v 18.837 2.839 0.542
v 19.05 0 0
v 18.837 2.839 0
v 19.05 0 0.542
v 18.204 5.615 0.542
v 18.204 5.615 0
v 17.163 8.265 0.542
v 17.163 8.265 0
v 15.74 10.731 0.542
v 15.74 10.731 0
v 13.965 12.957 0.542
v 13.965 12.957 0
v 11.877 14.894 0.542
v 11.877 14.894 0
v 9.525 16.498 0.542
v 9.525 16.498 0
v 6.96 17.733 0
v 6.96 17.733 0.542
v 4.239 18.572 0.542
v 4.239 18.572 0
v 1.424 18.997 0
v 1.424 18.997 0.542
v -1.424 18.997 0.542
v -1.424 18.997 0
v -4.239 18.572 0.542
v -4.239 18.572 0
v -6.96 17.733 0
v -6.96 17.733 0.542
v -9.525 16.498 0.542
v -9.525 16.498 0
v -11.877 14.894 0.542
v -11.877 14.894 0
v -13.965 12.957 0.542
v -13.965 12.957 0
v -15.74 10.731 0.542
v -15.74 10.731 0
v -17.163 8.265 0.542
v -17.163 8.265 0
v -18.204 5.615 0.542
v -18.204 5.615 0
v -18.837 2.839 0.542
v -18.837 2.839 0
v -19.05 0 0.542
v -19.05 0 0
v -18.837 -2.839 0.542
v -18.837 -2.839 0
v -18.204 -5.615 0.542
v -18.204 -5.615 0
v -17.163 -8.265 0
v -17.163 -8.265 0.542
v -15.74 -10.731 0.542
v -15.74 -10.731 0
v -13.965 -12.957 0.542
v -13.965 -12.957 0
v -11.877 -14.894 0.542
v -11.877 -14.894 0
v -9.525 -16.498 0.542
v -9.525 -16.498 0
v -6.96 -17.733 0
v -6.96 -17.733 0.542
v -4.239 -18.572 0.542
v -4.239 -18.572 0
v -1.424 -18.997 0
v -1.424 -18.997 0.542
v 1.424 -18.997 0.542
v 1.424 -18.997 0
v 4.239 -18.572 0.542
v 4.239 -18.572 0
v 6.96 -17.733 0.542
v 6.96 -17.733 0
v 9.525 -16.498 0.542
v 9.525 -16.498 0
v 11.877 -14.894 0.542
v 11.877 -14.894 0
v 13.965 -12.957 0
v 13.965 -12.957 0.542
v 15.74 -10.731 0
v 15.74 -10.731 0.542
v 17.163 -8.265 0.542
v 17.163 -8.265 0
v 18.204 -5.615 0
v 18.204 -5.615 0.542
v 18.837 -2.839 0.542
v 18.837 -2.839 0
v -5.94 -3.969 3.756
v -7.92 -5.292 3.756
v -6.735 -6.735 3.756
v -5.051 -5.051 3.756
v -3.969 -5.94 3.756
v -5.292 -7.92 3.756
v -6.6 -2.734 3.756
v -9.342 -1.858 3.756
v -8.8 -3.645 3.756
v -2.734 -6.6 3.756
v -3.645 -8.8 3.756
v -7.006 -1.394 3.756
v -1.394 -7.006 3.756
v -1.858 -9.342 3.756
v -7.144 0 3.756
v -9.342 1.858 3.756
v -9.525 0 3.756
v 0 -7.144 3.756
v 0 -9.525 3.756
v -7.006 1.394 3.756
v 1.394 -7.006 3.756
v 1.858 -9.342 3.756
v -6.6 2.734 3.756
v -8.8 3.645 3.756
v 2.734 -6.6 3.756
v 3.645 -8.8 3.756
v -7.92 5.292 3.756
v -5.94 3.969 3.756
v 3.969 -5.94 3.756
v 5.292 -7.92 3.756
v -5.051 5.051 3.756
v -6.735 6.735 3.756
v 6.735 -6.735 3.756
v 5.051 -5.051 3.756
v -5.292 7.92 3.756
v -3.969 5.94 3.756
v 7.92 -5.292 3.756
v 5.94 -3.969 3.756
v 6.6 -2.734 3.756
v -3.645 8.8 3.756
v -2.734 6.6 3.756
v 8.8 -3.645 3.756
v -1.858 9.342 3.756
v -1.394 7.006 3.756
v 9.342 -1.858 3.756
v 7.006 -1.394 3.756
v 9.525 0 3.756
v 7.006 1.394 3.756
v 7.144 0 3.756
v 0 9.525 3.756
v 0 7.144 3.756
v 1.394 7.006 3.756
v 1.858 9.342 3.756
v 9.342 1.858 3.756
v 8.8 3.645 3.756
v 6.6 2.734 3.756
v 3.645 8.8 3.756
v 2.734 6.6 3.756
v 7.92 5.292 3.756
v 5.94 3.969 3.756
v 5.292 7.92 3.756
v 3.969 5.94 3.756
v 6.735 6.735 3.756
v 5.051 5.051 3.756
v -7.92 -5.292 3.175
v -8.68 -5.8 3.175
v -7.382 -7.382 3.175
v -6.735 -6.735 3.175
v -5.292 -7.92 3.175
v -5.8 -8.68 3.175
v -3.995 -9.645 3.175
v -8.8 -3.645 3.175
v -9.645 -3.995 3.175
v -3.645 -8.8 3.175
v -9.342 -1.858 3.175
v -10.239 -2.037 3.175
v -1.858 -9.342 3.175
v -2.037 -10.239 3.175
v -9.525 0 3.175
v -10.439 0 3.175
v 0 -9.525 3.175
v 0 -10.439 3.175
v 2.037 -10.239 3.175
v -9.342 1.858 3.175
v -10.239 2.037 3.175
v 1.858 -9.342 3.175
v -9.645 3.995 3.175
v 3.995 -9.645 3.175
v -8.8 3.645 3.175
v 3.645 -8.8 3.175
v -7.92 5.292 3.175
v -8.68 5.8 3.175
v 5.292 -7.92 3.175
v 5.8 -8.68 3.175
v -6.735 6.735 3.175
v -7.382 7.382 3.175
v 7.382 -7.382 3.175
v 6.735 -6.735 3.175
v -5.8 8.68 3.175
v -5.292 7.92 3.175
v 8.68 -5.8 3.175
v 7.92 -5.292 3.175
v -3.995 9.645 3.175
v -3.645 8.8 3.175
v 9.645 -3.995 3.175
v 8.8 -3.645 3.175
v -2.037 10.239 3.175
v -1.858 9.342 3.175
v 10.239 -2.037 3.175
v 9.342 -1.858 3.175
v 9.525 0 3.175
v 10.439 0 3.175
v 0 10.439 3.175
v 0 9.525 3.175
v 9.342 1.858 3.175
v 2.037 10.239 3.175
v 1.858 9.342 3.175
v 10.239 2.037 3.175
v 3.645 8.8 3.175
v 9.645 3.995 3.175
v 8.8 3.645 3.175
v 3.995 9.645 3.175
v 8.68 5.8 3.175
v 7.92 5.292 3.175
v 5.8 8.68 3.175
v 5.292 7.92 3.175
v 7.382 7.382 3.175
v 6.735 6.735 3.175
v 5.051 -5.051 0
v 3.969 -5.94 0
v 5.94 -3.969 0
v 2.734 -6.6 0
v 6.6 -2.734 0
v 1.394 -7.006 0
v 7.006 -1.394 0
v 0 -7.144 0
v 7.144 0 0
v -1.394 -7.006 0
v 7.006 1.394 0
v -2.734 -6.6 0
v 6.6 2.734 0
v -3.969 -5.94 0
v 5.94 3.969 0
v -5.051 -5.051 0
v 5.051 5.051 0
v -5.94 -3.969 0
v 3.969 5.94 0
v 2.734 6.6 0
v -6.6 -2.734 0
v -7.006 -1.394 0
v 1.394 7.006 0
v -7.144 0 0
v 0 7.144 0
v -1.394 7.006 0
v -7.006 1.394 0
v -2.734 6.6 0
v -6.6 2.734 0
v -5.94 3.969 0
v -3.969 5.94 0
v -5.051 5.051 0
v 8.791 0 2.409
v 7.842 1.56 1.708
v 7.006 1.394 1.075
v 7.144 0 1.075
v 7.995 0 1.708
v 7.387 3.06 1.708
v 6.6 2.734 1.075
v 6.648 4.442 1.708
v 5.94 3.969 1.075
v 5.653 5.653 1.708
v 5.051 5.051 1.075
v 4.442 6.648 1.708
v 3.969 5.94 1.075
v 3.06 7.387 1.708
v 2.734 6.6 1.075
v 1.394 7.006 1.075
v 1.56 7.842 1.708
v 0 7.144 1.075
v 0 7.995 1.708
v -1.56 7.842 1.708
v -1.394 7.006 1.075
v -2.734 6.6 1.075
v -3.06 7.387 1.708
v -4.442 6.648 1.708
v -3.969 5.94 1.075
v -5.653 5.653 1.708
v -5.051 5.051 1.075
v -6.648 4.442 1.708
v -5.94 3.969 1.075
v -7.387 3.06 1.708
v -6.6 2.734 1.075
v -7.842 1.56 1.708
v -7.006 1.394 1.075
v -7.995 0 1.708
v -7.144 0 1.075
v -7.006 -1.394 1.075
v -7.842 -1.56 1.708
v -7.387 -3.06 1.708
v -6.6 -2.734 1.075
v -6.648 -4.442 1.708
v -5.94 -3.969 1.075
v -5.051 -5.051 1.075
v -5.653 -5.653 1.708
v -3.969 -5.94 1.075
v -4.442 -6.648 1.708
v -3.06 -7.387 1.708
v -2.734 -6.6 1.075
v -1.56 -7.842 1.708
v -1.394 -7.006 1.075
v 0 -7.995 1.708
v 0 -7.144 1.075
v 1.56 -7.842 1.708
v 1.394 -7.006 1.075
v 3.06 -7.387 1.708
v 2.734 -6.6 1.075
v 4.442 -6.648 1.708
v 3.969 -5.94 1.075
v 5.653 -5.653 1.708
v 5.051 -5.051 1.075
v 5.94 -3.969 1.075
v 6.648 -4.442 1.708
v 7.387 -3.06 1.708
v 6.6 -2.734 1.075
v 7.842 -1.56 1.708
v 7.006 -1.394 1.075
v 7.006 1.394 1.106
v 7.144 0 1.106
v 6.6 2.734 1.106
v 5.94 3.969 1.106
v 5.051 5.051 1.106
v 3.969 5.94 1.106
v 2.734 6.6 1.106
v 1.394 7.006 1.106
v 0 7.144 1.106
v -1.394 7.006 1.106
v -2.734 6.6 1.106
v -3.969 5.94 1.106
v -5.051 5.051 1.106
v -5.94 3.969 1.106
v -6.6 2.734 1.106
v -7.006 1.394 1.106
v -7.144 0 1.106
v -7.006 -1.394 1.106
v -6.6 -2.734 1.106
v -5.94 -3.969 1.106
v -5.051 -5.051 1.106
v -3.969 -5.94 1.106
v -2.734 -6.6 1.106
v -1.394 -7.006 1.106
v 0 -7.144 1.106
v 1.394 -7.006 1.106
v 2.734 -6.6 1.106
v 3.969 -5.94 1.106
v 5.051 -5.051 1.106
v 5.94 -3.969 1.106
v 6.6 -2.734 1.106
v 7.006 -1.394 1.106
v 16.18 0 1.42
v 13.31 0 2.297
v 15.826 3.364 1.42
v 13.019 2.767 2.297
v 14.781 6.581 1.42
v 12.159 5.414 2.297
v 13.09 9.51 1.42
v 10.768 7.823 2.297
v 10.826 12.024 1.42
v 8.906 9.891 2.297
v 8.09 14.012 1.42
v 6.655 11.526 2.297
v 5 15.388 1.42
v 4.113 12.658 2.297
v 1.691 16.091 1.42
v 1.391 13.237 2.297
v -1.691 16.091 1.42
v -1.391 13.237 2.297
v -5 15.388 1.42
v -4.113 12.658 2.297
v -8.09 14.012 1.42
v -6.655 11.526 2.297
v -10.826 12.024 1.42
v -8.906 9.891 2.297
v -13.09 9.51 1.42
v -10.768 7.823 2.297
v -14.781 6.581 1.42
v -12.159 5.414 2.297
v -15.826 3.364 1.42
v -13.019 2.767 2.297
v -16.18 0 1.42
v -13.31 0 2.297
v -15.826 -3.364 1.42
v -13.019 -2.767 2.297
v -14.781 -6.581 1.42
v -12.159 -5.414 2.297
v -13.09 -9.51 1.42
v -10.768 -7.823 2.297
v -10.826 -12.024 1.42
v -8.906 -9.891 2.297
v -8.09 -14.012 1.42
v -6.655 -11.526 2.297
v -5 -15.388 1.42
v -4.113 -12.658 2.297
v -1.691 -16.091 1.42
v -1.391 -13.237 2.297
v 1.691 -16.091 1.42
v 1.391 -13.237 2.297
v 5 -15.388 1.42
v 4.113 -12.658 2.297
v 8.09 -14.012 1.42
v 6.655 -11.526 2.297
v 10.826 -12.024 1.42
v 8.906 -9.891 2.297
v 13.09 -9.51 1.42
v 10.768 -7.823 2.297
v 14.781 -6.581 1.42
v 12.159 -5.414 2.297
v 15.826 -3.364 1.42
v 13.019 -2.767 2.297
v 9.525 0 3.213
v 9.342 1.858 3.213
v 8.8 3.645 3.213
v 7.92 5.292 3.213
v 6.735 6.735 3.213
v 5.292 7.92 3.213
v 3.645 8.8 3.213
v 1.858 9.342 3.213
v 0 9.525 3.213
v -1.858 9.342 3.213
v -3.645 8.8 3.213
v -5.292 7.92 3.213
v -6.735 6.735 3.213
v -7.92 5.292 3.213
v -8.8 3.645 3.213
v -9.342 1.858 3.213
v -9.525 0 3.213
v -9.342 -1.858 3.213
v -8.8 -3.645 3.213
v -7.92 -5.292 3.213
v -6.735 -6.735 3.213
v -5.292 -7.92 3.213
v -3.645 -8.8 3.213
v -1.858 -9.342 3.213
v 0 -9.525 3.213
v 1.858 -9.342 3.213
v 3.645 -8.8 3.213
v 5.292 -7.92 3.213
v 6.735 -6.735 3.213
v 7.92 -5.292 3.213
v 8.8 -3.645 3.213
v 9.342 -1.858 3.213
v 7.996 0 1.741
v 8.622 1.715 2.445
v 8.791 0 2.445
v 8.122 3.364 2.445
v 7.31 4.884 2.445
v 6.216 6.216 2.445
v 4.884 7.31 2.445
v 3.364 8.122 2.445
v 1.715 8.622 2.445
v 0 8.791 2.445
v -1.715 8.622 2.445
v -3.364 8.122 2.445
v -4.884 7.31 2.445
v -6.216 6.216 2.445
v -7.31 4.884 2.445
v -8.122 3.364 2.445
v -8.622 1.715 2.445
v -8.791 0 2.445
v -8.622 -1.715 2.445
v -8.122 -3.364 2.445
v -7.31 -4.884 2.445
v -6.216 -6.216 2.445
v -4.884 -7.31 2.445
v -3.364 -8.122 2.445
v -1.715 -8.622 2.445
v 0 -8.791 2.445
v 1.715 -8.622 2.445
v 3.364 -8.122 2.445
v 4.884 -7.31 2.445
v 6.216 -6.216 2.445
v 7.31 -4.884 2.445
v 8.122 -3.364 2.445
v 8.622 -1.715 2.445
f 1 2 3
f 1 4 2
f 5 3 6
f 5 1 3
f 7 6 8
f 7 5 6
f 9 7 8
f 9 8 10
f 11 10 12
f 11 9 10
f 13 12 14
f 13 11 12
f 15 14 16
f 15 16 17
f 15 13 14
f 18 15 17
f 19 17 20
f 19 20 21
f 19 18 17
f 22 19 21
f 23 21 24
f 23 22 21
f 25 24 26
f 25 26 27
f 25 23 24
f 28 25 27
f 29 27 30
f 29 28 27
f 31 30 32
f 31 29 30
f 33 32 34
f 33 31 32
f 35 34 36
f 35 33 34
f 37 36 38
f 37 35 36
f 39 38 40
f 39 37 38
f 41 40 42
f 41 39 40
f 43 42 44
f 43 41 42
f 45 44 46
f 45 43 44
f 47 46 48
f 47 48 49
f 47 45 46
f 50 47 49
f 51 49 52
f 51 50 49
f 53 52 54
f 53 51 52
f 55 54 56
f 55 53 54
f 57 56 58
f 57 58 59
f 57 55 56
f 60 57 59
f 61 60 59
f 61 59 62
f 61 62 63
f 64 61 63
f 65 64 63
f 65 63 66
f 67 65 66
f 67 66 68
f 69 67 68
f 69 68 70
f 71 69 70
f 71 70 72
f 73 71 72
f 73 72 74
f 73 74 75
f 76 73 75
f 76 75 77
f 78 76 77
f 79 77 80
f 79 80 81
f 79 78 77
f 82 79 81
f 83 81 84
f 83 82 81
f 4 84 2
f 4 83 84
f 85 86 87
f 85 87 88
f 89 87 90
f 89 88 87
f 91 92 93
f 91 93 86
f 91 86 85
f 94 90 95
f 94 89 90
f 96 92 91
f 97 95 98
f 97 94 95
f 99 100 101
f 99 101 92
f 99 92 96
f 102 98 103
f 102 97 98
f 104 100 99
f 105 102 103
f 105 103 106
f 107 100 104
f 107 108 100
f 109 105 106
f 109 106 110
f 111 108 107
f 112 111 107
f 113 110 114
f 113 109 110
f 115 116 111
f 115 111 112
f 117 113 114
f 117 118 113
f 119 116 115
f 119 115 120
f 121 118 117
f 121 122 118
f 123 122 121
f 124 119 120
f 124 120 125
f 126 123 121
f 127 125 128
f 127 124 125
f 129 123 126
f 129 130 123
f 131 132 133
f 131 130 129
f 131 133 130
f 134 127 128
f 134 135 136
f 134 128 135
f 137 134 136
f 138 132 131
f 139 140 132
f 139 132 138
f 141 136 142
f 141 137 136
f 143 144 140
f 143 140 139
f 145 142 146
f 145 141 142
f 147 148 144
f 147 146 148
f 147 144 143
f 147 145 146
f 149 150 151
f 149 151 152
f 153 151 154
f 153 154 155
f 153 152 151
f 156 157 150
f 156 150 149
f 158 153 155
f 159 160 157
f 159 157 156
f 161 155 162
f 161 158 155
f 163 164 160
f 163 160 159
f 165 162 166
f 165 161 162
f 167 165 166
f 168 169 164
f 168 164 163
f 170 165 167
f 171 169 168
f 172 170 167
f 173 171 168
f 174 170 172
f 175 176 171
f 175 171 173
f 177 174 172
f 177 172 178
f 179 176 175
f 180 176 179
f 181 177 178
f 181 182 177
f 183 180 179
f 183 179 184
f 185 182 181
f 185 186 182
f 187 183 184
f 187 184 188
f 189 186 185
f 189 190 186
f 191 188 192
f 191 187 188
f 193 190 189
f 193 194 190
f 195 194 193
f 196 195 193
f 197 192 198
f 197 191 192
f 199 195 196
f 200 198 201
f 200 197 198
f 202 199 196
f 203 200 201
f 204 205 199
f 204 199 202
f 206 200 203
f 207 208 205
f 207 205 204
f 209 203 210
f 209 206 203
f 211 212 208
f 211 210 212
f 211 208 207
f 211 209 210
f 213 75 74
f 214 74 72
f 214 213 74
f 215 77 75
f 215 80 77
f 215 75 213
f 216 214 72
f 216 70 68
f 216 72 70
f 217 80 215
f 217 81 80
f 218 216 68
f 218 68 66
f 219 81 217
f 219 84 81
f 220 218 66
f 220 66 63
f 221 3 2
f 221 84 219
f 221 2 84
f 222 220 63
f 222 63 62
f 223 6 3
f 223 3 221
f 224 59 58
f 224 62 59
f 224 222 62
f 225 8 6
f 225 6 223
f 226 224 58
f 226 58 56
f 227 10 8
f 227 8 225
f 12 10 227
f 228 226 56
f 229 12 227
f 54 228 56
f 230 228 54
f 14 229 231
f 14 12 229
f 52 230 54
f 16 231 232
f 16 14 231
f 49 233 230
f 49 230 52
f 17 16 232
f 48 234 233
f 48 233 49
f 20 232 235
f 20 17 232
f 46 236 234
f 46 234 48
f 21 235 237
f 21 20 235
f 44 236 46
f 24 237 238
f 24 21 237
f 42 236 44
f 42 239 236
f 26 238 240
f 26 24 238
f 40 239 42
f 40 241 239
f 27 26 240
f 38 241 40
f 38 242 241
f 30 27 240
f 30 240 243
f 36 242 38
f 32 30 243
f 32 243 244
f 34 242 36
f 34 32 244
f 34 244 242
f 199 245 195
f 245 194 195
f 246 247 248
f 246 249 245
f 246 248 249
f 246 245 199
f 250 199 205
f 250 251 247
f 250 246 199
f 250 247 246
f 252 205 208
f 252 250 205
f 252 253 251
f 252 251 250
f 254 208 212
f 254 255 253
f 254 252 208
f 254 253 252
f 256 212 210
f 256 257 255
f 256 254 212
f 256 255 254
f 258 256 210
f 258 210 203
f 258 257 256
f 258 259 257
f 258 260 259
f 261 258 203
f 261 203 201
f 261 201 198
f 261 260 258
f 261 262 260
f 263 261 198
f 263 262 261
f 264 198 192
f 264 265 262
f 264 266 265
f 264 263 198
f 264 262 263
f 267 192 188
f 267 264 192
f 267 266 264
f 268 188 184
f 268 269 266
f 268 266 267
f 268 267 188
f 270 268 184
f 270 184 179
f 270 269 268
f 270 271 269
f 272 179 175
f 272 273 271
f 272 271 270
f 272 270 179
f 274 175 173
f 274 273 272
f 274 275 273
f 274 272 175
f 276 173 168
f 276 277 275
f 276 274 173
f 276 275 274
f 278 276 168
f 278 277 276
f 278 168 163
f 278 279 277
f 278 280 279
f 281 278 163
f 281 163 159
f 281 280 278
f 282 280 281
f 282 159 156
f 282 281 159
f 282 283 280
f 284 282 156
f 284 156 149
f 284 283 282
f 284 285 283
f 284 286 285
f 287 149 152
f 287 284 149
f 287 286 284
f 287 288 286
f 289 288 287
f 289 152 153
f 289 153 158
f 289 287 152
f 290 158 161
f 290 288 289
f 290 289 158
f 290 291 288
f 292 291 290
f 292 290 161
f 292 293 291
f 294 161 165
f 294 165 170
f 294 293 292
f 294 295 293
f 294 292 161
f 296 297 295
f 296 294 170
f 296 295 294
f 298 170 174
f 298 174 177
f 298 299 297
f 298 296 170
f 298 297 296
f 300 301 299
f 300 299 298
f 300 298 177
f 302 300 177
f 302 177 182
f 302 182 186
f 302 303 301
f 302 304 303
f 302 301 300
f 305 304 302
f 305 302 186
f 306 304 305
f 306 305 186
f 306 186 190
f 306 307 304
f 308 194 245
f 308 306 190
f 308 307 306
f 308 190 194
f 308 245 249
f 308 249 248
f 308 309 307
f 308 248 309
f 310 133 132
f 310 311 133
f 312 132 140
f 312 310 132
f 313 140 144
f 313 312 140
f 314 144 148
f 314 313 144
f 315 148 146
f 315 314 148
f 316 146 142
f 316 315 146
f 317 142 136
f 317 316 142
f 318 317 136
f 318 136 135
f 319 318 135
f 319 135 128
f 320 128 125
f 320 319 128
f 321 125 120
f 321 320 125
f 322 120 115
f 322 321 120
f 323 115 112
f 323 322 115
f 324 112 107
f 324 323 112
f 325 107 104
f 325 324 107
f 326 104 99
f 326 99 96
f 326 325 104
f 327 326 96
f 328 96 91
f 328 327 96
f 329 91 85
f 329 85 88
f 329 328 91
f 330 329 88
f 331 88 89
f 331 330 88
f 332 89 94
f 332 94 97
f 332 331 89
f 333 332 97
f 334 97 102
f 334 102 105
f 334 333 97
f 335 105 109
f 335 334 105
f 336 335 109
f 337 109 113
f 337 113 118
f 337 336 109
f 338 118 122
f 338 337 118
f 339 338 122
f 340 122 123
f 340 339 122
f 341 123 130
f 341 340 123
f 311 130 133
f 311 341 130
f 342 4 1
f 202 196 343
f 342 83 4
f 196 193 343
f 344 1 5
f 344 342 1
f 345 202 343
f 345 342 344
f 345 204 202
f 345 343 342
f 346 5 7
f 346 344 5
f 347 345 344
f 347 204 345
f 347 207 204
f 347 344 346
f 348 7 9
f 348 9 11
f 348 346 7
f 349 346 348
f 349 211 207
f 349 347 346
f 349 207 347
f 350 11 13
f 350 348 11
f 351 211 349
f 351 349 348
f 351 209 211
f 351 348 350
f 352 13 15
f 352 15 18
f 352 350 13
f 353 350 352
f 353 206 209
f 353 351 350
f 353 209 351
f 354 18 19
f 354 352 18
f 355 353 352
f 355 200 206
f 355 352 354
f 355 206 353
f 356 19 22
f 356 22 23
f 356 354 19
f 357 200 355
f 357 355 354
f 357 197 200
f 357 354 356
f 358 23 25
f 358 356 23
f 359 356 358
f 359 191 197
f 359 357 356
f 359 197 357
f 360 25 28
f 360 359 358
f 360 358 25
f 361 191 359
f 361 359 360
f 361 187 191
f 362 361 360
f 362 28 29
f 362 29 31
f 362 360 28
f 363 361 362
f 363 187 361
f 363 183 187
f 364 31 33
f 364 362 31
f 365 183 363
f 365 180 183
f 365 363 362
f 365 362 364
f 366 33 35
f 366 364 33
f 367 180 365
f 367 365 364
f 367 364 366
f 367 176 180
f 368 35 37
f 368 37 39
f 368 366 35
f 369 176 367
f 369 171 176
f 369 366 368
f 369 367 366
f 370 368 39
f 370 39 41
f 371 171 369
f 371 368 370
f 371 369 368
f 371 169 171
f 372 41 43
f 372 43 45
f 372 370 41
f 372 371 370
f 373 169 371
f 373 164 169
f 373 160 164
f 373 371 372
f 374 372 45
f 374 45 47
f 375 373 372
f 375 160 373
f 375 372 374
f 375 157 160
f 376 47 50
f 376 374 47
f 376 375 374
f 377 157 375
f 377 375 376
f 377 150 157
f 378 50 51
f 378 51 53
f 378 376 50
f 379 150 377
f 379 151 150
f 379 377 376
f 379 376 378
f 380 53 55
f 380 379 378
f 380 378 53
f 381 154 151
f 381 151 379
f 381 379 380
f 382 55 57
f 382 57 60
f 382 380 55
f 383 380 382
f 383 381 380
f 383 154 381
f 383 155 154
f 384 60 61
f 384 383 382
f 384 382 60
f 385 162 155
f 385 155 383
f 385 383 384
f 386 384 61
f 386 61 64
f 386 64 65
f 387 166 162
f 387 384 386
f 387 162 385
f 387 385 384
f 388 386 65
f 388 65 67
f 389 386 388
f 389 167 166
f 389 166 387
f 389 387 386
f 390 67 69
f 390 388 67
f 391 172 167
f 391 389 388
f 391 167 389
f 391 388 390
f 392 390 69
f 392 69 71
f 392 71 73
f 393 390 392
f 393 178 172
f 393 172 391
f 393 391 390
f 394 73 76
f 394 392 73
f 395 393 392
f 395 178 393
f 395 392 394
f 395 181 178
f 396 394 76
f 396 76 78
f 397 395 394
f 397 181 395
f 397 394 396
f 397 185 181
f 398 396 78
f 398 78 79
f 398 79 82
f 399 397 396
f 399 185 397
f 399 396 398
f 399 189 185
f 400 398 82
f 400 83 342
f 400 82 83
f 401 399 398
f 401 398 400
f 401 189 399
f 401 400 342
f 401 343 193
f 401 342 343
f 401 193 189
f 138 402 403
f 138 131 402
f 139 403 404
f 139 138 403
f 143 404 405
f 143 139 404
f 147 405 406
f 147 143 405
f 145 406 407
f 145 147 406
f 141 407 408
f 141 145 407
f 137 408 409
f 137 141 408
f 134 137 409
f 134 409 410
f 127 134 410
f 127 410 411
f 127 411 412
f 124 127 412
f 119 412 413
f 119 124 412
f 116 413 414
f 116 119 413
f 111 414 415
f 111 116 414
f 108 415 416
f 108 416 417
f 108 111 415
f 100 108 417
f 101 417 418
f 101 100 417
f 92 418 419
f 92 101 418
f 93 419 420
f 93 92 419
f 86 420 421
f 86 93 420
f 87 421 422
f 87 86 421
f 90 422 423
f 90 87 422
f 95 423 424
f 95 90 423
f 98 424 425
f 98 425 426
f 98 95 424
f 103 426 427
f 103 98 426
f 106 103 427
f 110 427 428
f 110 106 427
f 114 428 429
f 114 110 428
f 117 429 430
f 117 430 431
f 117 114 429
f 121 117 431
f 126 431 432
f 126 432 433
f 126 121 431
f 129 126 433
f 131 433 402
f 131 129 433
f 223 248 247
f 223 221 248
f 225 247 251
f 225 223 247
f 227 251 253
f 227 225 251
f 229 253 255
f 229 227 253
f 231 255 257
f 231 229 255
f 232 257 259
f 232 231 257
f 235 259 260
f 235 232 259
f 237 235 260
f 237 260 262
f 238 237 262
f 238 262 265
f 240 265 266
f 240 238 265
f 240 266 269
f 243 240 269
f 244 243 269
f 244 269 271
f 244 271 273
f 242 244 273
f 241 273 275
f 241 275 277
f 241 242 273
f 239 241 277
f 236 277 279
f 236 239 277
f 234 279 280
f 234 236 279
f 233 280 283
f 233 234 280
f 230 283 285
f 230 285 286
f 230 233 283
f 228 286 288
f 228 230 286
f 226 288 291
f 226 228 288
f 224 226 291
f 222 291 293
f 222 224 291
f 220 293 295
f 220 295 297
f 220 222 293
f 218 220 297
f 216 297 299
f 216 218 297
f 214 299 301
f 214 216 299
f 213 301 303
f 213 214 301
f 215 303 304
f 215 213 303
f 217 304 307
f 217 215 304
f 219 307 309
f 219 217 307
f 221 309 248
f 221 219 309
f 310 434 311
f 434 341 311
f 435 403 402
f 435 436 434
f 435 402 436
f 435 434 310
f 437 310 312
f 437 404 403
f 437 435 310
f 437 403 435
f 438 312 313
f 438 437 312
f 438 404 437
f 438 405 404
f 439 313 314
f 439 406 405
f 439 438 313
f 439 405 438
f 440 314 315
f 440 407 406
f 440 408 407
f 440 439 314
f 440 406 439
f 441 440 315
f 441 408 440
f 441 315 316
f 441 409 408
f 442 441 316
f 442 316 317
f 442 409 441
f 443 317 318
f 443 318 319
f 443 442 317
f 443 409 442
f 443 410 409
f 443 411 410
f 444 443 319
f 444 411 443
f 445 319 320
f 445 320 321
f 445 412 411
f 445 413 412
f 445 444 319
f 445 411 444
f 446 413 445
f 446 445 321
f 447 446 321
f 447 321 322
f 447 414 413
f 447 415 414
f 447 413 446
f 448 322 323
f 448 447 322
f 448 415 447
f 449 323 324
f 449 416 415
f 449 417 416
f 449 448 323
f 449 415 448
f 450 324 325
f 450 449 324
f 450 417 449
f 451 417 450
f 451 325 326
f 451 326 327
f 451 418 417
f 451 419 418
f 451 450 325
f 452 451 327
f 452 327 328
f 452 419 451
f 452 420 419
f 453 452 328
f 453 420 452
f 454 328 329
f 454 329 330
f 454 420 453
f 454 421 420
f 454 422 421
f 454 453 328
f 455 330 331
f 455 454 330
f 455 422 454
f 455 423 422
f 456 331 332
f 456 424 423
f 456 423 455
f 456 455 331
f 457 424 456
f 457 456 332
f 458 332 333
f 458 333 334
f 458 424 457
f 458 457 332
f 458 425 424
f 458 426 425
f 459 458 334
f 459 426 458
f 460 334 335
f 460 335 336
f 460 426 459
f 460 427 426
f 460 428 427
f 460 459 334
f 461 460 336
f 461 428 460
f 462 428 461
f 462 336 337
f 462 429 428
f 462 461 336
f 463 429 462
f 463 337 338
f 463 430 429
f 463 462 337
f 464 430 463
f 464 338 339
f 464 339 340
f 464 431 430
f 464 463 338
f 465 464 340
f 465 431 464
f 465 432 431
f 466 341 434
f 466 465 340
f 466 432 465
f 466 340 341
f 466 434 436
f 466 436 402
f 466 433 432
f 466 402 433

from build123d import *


with BuildPart() as f1:
    # F0 (on Front) → F1 (revolve)
    with BuildSketch(Plane.XZ):
        with BuildLine():
            Line((7.14375, 0), (19.05, 0))
            Line((19.05, 0), (19.05, 0.542475))
            Line((19.05, 0.542475), (10.4394, 3.175))
            Line((10.4394, 3.175), (9.525, 3.175))
            ThreePointArc((9.525, 3.175), (8.40026, 2.05026), (7.14375, 1.074935))
            Line((7.14375, 1.074935), (7.14375, 0))
        make_face()
    revolve(axis=Axis((0, 0, 1.185228), (0, 0, 1)))


with BuildPart() as f3:
    # F2 (on Front) → F3 (revolve)
    with BuildSketch(Plane.XZ):
        with BuildLine():
            Line((7.14375, 3.755926), (7.14375, 1.10567))
            ThreePointArc((7.14375, 1.10567), (8.400744, 2.084581), (9.525, 3.213451))
            Line((9.525, 3.213451), (9.525, 3.755926))
            Line((9.525, 3.755926), (7.14375, 3.755926))
        make_face()
    revolve(axis=Axis((0, 0, 1.185228), (0, 0, 1)))


solid = Compound([f1.part, f3.part])
